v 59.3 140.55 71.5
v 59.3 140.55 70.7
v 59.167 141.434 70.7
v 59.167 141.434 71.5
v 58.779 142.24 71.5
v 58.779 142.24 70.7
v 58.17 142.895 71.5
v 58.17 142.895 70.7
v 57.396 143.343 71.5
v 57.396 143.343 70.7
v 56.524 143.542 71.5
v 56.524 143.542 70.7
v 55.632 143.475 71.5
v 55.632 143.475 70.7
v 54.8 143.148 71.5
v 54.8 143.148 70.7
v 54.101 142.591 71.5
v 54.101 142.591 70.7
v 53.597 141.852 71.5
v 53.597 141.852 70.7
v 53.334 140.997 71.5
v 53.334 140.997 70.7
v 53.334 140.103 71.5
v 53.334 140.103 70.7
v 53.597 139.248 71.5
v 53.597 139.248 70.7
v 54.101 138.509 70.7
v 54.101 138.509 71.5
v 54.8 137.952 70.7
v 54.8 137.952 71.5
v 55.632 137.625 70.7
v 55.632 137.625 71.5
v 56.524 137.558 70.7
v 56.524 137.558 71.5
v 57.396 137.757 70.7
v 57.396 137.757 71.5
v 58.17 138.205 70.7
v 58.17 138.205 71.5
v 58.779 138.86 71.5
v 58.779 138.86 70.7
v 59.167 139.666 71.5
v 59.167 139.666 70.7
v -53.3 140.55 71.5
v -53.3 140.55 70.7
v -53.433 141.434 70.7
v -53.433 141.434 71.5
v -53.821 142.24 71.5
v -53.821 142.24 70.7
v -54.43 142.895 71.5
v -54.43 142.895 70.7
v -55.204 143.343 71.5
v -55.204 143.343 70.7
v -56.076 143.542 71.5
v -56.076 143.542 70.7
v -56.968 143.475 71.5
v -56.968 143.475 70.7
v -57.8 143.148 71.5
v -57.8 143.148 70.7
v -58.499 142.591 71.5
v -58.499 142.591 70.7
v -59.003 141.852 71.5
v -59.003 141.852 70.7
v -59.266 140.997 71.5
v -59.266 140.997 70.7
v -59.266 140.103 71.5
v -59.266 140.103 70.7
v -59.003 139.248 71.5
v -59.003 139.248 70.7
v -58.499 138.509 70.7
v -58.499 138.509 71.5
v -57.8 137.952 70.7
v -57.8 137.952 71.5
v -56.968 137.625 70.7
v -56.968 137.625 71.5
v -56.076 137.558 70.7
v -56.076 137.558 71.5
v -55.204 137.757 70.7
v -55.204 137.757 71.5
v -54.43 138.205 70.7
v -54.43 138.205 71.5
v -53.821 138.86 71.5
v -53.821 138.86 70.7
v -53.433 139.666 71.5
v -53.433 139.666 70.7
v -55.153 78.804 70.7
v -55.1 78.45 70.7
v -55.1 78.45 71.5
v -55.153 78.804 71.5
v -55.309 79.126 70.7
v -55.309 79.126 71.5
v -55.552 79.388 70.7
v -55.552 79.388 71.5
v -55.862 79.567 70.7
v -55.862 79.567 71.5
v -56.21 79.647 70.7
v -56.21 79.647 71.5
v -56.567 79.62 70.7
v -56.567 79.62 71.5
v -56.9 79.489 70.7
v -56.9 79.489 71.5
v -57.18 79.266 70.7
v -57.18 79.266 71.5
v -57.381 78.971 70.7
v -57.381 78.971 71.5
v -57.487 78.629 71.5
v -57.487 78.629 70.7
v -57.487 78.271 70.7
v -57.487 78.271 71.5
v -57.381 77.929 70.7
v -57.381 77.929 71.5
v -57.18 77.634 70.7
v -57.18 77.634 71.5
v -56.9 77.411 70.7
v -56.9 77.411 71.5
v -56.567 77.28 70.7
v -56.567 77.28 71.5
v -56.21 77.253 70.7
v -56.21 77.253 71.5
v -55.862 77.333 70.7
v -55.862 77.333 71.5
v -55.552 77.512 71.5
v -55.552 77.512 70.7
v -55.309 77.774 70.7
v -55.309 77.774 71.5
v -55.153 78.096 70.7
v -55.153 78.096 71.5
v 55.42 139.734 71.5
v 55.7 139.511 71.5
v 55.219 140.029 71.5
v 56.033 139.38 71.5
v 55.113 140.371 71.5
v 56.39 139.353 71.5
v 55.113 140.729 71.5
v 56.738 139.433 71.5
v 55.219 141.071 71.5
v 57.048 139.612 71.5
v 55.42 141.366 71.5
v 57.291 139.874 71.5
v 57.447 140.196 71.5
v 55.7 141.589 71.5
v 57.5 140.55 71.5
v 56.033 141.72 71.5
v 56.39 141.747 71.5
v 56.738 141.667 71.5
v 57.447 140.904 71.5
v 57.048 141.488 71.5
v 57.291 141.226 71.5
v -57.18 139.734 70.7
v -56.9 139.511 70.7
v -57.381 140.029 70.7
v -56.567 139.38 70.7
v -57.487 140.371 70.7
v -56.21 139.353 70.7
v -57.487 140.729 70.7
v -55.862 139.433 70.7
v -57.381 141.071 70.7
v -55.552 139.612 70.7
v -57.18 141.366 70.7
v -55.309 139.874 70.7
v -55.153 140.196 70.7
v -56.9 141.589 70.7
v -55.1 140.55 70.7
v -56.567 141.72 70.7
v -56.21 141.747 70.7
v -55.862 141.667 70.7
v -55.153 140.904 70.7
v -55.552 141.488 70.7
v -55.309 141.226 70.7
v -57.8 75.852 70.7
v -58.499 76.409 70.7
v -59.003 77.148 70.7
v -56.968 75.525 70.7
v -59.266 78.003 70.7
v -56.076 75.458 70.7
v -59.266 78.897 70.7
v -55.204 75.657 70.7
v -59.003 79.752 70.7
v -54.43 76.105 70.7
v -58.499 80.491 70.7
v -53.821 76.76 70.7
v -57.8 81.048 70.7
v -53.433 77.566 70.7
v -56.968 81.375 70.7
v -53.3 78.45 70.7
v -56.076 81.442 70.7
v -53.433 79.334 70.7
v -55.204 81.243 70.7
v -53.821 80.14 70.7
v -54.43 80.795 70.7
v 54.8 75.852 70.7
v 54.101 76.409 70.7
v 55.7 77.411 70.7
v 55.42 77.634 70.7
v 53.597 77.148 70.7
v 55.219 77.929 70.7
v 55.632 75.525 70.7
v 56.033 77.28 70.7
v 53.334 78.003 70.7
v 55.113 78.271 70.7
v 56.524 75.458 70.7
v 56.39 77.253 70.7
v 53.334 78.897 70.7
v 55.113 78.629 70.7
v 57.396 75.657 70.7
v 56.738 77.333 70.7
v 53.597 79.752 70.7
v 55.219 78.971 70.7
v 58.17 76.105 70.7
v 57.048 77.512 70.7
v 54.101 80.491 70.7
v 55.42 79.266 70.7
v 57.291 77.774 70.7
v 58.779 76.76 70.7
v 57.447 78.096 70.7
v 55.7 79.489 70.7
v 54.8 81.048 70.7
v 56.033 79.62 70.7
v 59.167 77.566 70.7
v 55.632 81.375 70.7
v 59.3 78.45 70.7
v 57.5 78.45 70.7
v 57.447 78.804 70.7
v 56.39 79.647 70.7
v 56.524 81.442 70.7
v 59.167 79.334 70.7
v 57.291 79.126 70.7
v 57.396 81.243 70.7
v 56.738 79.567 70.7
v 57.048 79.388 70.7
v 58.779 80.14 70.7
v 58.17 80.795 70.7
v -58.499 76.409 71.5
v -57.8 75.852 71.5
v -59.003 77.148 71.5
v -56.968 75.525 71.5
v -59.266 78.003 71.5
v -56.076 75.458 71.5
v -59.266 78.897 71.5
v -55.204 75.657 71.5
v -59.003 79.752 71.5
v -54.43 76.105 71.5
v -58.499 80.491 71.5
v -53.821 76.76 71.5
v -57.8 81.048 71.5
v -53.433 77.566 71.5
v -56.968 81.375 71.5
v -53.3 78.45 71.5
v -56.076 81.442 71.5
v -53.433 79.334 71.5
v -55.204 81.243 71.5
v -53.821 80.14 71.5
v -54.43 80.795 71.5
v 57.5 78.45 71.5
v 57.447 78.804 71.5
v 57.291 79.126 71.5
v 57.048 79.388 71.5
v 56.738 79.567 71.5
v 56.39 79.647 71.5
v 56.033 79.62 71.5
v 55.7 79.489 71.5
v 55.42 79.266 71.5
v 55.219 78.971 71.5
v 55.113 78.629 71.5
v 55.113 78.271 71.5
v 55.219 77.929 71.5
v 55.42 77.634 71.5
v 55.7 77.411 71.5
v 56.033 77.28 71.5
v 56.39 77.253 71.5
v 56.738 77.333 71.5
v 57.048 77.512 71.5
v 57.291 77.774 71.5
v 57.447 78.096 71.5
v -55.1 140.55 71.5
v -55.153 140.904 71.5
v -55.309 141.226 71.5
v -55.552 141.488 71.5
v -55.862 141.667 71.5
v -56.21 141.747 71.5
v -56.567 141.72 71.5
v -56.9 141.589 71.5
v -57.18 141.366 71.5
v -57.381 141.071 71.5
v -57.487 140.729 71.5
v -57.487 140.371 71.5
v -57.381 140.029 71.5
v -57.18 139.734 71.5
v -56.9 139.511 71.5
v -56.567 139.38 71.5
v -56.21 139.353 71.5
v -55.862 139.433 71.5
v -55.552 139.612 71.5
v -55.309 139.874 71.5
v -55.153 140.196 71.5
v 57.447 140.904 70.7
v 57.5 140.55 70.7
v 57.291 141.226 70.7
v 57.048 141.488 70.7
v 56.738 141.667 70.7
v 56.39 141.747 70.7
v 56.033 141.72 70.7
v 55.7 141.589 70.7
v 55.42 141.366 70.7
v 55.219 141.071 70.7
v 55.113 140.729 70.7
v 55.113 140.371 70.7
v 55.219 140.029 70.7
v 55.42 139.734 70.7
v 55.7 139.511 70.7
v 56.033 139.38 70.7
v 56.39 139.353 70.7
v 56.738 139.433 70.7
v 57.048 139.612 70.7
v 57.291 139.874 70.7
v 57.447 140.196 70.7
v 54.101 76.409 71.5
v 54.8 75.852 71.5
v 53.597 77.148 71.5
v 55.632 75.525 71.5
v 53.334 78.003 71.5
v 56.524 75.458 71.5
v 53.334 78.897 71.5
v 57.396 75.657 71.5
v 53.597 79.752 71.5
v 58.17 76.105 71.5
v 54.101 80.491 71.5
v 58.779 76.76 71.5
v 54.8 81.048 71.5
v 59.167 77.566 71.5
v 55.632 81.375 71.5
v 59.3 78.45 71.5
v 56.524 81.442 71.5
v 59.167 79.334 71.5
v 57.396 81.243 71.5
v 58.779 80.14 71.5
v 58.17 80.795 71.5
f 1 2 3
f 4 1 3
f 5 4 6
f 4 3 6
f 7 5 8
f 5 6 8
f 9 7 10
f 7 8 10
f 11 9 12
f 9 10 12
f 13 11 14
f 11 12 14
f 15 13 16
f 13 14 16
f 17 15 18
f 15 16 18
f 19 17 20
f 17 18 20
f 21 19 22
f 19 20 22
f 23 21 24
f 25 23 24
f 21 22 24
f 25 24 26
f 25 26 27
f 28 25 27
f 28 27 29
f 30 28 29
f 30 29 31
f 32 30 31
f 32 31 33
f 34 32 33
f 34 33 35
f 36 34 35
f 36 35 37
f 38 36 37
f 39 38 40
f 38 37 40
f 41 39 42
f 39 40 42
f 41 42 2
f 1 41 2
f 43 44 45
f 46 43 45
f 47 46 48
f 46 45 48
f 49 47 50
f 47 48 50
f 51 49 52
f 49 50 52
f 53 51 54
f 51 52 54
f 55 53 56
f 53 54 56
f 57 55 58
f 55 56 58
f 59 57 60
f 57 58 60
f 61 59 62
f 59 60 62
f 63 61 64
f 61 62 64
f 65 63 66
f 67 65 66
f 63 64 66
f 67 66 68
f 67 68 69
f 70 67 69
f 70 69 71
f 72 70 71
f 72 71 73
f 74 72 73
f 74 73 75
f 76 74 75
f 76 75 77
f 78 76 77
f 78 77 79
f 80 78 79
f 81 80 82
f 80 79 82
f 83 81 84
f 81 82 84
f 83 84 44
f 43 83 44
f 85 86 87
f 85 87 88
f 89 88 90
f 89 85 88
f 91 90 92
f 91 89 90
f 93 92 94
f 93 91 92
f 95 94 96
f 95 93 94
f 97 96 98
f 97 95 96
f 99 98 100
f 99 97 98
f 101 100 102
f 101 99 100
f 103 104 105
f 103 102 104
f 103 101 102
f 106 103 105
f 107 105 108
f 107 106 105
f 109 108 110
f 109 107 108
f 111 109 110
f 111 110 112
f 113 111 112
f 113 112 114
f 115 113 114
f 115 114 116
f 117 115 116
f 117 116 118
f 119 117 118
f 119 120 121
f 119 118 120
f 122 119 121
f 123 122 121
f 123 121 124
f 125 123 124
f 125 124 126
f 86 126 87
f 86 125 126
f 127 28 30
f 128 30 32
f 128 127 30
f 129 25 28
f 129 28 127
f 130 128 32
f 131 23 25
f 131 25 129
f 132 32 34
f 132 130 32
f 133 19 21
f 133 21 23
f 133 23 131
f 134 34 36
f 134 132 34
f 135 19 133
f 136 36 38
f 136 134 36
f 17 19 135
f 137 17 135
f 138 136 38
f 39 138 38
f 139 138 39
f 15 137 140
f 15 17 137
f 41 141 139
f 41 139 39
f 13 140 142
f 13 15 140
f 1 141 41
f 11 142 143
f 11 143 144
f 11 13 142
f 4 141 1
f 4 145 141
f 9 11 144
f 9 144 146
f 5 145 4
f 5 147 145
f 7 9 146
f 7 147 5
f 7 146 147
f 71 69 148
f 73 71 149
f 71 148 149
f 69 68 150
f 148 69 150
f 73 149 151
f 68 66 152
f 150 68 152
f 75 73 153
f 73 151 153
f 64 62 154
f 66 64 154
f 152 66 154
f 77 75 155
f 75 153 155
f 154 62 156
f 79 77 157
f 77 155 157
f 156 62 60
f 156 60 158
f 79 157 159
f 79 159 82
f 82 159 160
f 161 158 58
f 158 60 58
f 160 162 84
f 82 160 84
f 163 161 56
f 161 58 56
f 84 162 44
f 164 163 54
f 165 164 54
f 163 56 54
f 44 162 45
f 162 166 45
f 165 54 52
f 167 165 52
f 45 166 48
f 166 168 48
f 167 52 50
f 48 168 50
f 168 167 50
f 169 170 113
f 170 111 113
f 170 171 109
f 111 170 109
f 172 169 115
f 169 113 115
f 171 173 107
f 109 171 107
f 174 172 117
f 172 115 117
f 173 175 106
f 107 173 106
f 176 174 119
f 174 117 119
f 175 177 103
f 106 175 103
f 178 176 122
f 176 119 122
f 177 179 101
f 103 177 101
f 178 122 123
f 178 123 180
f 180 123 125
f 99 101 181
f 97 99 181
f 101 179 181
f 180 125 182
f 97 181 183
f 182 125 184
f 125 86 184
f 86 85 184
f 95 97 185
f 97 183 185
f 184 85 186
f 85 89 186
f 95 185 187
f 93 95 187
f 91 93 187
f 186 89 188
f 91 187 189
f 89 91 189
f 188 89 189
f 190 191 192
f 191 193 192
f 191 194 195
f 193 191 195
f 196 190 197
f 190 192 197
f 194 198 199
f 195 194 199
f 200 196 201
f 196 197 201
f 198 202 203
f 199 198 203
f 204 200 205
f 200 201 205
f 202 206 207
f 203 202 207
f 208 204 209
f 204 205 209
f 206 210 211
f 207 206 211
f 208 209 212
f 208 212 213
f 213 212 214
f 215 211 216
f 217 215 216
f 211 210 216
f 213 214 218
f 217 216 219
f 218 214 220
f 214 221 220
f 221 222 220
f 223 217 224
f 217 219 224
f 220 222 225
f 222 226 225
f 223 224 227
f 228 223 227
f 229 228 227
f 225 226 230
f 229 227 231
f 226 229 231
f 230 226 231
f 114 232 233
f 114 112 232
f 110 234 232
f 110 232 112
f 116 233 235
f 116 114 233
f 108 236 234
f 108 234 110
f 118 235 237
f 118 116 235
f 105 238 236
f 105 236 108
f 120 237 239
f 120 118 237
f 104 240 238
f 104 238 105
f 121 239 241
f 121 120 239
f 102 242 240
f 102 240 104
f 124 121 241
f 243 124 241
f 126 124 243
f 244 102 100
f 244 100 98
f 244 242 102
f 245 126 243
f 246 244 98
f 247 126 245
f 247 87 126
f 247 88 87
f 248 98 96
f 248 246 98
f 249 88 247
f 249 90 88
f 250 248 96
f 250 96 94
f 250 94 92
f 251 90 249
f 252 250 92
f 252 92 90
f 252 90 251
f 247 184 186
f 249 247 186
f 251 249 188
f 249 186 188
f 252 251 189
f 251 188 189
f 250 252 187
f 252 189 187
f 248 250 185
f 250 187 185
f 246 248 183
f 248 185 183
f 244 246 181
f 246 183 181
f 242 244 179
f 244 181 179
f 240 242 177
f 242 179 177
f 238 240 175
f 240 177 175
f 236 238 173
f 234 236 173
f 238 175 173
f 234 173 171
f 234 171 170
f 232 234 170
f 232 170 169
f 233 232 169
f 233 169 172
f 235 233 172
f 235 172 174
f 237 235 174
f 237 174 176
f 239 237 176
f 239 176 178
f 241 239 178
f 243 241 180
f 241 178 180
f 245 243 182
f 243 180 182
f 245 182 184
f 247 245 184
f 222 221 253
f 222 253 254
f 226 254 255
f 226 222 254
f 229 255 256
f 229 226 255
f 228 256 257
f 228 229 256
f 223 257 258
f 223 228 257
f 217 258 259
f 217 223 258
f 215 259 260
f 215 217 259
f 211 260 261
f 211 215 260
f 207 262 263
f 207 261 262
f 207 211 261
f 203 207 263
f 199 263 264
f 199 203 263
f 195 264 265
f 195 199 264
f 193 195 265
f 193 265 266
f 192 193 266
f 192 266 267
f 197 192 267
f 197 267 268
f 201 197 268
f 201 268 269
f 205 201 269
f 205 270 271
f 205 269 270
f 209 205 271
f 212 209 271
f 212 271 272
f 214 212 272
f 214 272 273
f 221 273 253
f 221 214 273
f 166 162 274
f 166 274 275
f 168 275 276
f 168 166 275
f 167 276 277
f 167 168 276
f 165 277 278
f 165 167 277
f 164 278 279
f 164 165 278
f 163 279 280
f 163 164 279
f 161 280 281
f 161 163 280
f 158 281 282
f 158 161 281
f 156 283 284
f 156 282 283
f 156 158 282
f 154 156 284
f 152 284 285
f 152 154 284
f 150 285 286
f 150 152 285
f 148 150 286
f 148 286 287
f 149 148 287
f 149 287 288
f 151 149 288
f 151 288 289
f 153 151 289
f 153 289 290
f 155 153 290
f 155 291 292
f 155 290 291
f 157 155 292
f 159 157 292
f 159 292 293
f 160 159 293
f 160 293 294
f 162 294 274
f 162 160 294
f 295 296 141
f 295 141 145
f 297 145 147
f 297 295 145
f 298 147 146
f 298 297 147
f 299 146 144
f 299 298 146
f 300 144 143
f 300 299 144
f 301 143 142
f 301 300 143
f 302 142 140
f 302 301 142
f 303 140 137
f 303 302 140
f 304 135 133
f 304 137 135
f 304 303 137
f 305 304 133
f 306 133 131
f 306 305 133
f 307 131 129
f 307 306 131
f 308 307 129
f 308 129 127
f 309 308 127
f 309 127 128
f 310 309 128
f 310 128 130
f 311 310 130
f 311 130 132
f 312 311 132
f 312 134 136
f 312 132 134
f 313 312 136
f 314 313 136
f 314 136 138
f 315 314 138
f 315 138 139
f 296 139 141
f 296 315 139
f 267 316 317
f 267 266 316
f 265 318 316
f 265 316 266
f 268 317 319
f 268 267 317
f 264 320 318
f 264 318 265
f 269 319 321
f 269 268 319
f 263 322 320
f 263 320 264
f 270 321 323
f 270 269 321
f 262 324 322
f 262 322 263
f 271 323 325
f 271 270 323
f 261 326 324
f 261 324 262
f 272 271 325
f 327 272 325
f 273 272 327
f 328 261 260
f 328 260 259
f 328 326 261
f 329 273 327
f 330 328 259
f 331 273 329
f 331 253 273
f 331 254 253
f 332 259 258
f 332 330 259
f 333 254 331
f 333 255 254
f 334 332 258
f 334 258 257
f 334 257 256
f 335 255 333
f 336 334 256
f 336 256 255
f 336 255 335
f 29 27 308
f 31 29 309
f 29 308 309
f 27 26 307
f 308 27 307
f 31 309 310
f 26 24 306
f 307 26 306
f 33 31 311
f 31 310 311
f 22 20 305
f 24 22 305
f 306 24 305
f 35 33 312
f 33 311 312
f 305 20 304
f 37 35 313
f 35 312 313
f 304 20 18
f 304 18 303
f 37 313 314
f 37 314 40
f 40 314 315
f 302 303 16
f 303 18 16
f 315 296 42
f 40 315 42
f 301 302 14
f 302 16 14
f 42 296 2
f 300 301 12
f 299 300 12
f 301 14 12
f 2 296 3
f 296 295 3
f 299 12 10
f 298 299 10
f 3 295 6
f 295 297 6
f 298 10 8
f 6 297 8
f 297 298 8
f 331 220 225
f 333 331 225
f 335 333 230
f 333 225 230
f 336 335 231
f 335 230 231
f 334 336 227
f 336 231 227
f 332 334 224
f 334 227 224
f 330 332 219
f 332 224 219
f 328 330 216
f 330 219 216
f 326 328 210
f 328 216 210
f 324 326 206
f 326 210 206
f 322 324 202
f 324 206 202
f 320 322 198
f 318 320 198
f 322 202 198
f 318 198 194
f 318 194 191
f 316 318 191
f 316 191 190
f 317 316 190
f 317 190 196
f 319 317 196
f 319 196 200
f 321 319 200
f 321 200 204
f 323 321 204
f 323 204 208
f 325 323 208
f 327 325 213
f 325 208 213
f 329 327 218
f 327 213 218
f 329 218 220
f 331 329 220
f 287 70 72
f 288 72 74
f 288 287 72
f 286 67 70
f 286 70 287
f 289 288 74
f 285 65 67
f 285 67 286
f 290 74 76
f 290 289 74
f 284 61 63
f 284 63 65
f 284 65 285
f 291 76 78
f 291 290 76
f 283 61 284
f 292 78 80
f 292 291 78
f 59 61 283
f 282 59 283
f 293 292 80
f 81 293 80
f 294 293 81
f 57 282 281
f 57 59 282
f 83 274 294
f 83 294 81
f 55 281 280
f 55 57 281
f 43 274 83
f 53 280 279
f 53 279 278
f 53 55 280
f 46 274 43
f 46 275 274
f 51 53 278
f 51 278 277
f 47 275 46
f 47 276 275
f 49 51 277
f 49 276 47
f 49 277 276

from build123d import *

# Parameters (mm, degrees)
BOSS_EXTRUDE1_START = 70.7
SKETCH1_R           = 3
BOSS_EXTRUDE1_DEPTH = 0.8
BOSS_EXTRUDE2_START = 70.1
SKETCH2_R           = 1.2
BOSS_EXTRUDE2_DEPTH = 3
BOSS_EXTRUDE3_START = 70.7
SKETCH3_R           = 3
BOSS_EXTRUDE3_DEPTH = 0.8
BOSS_EXTRUDE4_START = 70.1
SKETCH4_R           = 1.2
BOSS_EXTRUDE4_DEPTH = 3
BOSS_EXTRUDE5_START = 70.7
SKETCH5_R           = 3
BOSS_EXTRUDE5_DEPTH = 0.8
BOSS_EXTRUDE6_START = 70.1
SKETCH6_R           = 1.2
BOSS_EXTRUDE6_DEPTH = 3
BOSS_EXTRUDE7_START = 70.7
SKETCH7_R           = 3
BOSS_EXTRUDE7_DEPTH = 0.8
BOSS_EXTRUDE8_START = 70.1
SKETCH8_R           = 1.2
BOSS_EXTRUDE8_DEPTH = 3


with BuildPart() as part:
    # Sketch1 → Boss-Extrude1 (new body)
    with BuildSketch(Plane.XY.offset(BOSS_EXTRUDE1_START)):
        with Locations((-56.3, 78.45)):
            Circle(SKETCH1_R)
    extrude(amount=BOSS_EXTRUDE1_DEPTH)


with BuildPart() as body_2:
    # Sketch2 → Boss-Extrude2 (new body)
    with BuildSketch(Plane.XY.offset(BOSS_EXTRUDE2_START)):
        with Locations((-56.3, 78.45)):
            Circle(SKETCH2_R)
    extrude(amount=BOSS_EXTRUDE2_DEPTH)


with BuildPart() as part_1:
    add(part.part)

    # Combine1: cut body 2
    add(body_2.part, mode=Mode.SUBTRACT)


with BuildPart() as body_2_2:
    # Sketch3 → Boss-Extrude3 (new body)
    with BuildSketch(Plane.XY.offset(BOSS_EXTRUDE3_START)):
        with Locations((-56.3, 140.55)):
            Circle(SKETCH3_R)
    extrude(amount=BOSS_EXTRUDE3_DEPTH)


with BuildPart() as body_3:
    # Sketch4 → Boss-Extrude4 (new body)
    with BuildSketch(Plane.XY.offset(BOSS_EXTRUDE4_START)):
        with Locations((-56.3, 140.55)):
            Circle(SKETCH4_R)
    extrude(amount=BOSS_EXTRUDE4_DEPTH)


with BuildPart() as body_2_2_1:
    add(body_2_2.part)

    # Combine2: cut body 3
    add(body_3.part, mode=Mode.SUBTRACT)


with BuildPart() as body_3_2:
    # Sketch5 → Boss-Extrude5 (new body)
    with BuildSketch(Plane.XY.offset(BOSS_EXTRUDE5_START)):
        with Locations((56.3, 78.45)):
            Circle(SKETCH5_R)
    extrude(amount=BOSS_EXTRUDE5_DEPTH)


with BuildPart() as body_4:
    # Sketch6 → Boss-Extrude6 (new body)
    with BuildSketch(Plane.XY.offset(BOSS_EXTRUDE6_START)):
        with Locations((56.3, 78.45)):
            Circle(SKETCH6_R)
    extrude(amount=BOSS_EXTRUDE6_DEPTH)


with BuildPart() as body_3_2_1:
    add(body_3_2.part)

    # Combine3: cut body 4
    add(body_4.part, mode=Mode.SUBTRACT)


with BuildPart() as body_4_2:
    # Sketch7 → Boss-Extrude7 (new body)
    with BuildSketch(Plane.XY.offset(BOSS_EXTRUDE7_START)):
        with Locations((56.3, 140.55)):
            Circle(SKETCH7_R)
    extrude(amount=BOSS_EXTRUDE7_DEPTH)


with BuildPart() as body_5:
    # Sketch8 → Boss-Extrude8 (new body)
    with BuildSketch(Plane.XY.offset(BOSS_EXTRUDE8_START)):
        with Locations((56.3, 140.55)):
            Circle(SKETCH8_R)
    extrude(amount=BOSS_EXTRUDE8_DEPTH)


with BuildPart() as body_4_2_1:
    add(body_4_2.part)

    # Combine4: cut body 5
    add(body_5.part, mode=Mode.SUBTRACT)


solid = Compound([part_1.part, body_2_2_1.part, body_3_2_1.part, body_4_2_1.part])
